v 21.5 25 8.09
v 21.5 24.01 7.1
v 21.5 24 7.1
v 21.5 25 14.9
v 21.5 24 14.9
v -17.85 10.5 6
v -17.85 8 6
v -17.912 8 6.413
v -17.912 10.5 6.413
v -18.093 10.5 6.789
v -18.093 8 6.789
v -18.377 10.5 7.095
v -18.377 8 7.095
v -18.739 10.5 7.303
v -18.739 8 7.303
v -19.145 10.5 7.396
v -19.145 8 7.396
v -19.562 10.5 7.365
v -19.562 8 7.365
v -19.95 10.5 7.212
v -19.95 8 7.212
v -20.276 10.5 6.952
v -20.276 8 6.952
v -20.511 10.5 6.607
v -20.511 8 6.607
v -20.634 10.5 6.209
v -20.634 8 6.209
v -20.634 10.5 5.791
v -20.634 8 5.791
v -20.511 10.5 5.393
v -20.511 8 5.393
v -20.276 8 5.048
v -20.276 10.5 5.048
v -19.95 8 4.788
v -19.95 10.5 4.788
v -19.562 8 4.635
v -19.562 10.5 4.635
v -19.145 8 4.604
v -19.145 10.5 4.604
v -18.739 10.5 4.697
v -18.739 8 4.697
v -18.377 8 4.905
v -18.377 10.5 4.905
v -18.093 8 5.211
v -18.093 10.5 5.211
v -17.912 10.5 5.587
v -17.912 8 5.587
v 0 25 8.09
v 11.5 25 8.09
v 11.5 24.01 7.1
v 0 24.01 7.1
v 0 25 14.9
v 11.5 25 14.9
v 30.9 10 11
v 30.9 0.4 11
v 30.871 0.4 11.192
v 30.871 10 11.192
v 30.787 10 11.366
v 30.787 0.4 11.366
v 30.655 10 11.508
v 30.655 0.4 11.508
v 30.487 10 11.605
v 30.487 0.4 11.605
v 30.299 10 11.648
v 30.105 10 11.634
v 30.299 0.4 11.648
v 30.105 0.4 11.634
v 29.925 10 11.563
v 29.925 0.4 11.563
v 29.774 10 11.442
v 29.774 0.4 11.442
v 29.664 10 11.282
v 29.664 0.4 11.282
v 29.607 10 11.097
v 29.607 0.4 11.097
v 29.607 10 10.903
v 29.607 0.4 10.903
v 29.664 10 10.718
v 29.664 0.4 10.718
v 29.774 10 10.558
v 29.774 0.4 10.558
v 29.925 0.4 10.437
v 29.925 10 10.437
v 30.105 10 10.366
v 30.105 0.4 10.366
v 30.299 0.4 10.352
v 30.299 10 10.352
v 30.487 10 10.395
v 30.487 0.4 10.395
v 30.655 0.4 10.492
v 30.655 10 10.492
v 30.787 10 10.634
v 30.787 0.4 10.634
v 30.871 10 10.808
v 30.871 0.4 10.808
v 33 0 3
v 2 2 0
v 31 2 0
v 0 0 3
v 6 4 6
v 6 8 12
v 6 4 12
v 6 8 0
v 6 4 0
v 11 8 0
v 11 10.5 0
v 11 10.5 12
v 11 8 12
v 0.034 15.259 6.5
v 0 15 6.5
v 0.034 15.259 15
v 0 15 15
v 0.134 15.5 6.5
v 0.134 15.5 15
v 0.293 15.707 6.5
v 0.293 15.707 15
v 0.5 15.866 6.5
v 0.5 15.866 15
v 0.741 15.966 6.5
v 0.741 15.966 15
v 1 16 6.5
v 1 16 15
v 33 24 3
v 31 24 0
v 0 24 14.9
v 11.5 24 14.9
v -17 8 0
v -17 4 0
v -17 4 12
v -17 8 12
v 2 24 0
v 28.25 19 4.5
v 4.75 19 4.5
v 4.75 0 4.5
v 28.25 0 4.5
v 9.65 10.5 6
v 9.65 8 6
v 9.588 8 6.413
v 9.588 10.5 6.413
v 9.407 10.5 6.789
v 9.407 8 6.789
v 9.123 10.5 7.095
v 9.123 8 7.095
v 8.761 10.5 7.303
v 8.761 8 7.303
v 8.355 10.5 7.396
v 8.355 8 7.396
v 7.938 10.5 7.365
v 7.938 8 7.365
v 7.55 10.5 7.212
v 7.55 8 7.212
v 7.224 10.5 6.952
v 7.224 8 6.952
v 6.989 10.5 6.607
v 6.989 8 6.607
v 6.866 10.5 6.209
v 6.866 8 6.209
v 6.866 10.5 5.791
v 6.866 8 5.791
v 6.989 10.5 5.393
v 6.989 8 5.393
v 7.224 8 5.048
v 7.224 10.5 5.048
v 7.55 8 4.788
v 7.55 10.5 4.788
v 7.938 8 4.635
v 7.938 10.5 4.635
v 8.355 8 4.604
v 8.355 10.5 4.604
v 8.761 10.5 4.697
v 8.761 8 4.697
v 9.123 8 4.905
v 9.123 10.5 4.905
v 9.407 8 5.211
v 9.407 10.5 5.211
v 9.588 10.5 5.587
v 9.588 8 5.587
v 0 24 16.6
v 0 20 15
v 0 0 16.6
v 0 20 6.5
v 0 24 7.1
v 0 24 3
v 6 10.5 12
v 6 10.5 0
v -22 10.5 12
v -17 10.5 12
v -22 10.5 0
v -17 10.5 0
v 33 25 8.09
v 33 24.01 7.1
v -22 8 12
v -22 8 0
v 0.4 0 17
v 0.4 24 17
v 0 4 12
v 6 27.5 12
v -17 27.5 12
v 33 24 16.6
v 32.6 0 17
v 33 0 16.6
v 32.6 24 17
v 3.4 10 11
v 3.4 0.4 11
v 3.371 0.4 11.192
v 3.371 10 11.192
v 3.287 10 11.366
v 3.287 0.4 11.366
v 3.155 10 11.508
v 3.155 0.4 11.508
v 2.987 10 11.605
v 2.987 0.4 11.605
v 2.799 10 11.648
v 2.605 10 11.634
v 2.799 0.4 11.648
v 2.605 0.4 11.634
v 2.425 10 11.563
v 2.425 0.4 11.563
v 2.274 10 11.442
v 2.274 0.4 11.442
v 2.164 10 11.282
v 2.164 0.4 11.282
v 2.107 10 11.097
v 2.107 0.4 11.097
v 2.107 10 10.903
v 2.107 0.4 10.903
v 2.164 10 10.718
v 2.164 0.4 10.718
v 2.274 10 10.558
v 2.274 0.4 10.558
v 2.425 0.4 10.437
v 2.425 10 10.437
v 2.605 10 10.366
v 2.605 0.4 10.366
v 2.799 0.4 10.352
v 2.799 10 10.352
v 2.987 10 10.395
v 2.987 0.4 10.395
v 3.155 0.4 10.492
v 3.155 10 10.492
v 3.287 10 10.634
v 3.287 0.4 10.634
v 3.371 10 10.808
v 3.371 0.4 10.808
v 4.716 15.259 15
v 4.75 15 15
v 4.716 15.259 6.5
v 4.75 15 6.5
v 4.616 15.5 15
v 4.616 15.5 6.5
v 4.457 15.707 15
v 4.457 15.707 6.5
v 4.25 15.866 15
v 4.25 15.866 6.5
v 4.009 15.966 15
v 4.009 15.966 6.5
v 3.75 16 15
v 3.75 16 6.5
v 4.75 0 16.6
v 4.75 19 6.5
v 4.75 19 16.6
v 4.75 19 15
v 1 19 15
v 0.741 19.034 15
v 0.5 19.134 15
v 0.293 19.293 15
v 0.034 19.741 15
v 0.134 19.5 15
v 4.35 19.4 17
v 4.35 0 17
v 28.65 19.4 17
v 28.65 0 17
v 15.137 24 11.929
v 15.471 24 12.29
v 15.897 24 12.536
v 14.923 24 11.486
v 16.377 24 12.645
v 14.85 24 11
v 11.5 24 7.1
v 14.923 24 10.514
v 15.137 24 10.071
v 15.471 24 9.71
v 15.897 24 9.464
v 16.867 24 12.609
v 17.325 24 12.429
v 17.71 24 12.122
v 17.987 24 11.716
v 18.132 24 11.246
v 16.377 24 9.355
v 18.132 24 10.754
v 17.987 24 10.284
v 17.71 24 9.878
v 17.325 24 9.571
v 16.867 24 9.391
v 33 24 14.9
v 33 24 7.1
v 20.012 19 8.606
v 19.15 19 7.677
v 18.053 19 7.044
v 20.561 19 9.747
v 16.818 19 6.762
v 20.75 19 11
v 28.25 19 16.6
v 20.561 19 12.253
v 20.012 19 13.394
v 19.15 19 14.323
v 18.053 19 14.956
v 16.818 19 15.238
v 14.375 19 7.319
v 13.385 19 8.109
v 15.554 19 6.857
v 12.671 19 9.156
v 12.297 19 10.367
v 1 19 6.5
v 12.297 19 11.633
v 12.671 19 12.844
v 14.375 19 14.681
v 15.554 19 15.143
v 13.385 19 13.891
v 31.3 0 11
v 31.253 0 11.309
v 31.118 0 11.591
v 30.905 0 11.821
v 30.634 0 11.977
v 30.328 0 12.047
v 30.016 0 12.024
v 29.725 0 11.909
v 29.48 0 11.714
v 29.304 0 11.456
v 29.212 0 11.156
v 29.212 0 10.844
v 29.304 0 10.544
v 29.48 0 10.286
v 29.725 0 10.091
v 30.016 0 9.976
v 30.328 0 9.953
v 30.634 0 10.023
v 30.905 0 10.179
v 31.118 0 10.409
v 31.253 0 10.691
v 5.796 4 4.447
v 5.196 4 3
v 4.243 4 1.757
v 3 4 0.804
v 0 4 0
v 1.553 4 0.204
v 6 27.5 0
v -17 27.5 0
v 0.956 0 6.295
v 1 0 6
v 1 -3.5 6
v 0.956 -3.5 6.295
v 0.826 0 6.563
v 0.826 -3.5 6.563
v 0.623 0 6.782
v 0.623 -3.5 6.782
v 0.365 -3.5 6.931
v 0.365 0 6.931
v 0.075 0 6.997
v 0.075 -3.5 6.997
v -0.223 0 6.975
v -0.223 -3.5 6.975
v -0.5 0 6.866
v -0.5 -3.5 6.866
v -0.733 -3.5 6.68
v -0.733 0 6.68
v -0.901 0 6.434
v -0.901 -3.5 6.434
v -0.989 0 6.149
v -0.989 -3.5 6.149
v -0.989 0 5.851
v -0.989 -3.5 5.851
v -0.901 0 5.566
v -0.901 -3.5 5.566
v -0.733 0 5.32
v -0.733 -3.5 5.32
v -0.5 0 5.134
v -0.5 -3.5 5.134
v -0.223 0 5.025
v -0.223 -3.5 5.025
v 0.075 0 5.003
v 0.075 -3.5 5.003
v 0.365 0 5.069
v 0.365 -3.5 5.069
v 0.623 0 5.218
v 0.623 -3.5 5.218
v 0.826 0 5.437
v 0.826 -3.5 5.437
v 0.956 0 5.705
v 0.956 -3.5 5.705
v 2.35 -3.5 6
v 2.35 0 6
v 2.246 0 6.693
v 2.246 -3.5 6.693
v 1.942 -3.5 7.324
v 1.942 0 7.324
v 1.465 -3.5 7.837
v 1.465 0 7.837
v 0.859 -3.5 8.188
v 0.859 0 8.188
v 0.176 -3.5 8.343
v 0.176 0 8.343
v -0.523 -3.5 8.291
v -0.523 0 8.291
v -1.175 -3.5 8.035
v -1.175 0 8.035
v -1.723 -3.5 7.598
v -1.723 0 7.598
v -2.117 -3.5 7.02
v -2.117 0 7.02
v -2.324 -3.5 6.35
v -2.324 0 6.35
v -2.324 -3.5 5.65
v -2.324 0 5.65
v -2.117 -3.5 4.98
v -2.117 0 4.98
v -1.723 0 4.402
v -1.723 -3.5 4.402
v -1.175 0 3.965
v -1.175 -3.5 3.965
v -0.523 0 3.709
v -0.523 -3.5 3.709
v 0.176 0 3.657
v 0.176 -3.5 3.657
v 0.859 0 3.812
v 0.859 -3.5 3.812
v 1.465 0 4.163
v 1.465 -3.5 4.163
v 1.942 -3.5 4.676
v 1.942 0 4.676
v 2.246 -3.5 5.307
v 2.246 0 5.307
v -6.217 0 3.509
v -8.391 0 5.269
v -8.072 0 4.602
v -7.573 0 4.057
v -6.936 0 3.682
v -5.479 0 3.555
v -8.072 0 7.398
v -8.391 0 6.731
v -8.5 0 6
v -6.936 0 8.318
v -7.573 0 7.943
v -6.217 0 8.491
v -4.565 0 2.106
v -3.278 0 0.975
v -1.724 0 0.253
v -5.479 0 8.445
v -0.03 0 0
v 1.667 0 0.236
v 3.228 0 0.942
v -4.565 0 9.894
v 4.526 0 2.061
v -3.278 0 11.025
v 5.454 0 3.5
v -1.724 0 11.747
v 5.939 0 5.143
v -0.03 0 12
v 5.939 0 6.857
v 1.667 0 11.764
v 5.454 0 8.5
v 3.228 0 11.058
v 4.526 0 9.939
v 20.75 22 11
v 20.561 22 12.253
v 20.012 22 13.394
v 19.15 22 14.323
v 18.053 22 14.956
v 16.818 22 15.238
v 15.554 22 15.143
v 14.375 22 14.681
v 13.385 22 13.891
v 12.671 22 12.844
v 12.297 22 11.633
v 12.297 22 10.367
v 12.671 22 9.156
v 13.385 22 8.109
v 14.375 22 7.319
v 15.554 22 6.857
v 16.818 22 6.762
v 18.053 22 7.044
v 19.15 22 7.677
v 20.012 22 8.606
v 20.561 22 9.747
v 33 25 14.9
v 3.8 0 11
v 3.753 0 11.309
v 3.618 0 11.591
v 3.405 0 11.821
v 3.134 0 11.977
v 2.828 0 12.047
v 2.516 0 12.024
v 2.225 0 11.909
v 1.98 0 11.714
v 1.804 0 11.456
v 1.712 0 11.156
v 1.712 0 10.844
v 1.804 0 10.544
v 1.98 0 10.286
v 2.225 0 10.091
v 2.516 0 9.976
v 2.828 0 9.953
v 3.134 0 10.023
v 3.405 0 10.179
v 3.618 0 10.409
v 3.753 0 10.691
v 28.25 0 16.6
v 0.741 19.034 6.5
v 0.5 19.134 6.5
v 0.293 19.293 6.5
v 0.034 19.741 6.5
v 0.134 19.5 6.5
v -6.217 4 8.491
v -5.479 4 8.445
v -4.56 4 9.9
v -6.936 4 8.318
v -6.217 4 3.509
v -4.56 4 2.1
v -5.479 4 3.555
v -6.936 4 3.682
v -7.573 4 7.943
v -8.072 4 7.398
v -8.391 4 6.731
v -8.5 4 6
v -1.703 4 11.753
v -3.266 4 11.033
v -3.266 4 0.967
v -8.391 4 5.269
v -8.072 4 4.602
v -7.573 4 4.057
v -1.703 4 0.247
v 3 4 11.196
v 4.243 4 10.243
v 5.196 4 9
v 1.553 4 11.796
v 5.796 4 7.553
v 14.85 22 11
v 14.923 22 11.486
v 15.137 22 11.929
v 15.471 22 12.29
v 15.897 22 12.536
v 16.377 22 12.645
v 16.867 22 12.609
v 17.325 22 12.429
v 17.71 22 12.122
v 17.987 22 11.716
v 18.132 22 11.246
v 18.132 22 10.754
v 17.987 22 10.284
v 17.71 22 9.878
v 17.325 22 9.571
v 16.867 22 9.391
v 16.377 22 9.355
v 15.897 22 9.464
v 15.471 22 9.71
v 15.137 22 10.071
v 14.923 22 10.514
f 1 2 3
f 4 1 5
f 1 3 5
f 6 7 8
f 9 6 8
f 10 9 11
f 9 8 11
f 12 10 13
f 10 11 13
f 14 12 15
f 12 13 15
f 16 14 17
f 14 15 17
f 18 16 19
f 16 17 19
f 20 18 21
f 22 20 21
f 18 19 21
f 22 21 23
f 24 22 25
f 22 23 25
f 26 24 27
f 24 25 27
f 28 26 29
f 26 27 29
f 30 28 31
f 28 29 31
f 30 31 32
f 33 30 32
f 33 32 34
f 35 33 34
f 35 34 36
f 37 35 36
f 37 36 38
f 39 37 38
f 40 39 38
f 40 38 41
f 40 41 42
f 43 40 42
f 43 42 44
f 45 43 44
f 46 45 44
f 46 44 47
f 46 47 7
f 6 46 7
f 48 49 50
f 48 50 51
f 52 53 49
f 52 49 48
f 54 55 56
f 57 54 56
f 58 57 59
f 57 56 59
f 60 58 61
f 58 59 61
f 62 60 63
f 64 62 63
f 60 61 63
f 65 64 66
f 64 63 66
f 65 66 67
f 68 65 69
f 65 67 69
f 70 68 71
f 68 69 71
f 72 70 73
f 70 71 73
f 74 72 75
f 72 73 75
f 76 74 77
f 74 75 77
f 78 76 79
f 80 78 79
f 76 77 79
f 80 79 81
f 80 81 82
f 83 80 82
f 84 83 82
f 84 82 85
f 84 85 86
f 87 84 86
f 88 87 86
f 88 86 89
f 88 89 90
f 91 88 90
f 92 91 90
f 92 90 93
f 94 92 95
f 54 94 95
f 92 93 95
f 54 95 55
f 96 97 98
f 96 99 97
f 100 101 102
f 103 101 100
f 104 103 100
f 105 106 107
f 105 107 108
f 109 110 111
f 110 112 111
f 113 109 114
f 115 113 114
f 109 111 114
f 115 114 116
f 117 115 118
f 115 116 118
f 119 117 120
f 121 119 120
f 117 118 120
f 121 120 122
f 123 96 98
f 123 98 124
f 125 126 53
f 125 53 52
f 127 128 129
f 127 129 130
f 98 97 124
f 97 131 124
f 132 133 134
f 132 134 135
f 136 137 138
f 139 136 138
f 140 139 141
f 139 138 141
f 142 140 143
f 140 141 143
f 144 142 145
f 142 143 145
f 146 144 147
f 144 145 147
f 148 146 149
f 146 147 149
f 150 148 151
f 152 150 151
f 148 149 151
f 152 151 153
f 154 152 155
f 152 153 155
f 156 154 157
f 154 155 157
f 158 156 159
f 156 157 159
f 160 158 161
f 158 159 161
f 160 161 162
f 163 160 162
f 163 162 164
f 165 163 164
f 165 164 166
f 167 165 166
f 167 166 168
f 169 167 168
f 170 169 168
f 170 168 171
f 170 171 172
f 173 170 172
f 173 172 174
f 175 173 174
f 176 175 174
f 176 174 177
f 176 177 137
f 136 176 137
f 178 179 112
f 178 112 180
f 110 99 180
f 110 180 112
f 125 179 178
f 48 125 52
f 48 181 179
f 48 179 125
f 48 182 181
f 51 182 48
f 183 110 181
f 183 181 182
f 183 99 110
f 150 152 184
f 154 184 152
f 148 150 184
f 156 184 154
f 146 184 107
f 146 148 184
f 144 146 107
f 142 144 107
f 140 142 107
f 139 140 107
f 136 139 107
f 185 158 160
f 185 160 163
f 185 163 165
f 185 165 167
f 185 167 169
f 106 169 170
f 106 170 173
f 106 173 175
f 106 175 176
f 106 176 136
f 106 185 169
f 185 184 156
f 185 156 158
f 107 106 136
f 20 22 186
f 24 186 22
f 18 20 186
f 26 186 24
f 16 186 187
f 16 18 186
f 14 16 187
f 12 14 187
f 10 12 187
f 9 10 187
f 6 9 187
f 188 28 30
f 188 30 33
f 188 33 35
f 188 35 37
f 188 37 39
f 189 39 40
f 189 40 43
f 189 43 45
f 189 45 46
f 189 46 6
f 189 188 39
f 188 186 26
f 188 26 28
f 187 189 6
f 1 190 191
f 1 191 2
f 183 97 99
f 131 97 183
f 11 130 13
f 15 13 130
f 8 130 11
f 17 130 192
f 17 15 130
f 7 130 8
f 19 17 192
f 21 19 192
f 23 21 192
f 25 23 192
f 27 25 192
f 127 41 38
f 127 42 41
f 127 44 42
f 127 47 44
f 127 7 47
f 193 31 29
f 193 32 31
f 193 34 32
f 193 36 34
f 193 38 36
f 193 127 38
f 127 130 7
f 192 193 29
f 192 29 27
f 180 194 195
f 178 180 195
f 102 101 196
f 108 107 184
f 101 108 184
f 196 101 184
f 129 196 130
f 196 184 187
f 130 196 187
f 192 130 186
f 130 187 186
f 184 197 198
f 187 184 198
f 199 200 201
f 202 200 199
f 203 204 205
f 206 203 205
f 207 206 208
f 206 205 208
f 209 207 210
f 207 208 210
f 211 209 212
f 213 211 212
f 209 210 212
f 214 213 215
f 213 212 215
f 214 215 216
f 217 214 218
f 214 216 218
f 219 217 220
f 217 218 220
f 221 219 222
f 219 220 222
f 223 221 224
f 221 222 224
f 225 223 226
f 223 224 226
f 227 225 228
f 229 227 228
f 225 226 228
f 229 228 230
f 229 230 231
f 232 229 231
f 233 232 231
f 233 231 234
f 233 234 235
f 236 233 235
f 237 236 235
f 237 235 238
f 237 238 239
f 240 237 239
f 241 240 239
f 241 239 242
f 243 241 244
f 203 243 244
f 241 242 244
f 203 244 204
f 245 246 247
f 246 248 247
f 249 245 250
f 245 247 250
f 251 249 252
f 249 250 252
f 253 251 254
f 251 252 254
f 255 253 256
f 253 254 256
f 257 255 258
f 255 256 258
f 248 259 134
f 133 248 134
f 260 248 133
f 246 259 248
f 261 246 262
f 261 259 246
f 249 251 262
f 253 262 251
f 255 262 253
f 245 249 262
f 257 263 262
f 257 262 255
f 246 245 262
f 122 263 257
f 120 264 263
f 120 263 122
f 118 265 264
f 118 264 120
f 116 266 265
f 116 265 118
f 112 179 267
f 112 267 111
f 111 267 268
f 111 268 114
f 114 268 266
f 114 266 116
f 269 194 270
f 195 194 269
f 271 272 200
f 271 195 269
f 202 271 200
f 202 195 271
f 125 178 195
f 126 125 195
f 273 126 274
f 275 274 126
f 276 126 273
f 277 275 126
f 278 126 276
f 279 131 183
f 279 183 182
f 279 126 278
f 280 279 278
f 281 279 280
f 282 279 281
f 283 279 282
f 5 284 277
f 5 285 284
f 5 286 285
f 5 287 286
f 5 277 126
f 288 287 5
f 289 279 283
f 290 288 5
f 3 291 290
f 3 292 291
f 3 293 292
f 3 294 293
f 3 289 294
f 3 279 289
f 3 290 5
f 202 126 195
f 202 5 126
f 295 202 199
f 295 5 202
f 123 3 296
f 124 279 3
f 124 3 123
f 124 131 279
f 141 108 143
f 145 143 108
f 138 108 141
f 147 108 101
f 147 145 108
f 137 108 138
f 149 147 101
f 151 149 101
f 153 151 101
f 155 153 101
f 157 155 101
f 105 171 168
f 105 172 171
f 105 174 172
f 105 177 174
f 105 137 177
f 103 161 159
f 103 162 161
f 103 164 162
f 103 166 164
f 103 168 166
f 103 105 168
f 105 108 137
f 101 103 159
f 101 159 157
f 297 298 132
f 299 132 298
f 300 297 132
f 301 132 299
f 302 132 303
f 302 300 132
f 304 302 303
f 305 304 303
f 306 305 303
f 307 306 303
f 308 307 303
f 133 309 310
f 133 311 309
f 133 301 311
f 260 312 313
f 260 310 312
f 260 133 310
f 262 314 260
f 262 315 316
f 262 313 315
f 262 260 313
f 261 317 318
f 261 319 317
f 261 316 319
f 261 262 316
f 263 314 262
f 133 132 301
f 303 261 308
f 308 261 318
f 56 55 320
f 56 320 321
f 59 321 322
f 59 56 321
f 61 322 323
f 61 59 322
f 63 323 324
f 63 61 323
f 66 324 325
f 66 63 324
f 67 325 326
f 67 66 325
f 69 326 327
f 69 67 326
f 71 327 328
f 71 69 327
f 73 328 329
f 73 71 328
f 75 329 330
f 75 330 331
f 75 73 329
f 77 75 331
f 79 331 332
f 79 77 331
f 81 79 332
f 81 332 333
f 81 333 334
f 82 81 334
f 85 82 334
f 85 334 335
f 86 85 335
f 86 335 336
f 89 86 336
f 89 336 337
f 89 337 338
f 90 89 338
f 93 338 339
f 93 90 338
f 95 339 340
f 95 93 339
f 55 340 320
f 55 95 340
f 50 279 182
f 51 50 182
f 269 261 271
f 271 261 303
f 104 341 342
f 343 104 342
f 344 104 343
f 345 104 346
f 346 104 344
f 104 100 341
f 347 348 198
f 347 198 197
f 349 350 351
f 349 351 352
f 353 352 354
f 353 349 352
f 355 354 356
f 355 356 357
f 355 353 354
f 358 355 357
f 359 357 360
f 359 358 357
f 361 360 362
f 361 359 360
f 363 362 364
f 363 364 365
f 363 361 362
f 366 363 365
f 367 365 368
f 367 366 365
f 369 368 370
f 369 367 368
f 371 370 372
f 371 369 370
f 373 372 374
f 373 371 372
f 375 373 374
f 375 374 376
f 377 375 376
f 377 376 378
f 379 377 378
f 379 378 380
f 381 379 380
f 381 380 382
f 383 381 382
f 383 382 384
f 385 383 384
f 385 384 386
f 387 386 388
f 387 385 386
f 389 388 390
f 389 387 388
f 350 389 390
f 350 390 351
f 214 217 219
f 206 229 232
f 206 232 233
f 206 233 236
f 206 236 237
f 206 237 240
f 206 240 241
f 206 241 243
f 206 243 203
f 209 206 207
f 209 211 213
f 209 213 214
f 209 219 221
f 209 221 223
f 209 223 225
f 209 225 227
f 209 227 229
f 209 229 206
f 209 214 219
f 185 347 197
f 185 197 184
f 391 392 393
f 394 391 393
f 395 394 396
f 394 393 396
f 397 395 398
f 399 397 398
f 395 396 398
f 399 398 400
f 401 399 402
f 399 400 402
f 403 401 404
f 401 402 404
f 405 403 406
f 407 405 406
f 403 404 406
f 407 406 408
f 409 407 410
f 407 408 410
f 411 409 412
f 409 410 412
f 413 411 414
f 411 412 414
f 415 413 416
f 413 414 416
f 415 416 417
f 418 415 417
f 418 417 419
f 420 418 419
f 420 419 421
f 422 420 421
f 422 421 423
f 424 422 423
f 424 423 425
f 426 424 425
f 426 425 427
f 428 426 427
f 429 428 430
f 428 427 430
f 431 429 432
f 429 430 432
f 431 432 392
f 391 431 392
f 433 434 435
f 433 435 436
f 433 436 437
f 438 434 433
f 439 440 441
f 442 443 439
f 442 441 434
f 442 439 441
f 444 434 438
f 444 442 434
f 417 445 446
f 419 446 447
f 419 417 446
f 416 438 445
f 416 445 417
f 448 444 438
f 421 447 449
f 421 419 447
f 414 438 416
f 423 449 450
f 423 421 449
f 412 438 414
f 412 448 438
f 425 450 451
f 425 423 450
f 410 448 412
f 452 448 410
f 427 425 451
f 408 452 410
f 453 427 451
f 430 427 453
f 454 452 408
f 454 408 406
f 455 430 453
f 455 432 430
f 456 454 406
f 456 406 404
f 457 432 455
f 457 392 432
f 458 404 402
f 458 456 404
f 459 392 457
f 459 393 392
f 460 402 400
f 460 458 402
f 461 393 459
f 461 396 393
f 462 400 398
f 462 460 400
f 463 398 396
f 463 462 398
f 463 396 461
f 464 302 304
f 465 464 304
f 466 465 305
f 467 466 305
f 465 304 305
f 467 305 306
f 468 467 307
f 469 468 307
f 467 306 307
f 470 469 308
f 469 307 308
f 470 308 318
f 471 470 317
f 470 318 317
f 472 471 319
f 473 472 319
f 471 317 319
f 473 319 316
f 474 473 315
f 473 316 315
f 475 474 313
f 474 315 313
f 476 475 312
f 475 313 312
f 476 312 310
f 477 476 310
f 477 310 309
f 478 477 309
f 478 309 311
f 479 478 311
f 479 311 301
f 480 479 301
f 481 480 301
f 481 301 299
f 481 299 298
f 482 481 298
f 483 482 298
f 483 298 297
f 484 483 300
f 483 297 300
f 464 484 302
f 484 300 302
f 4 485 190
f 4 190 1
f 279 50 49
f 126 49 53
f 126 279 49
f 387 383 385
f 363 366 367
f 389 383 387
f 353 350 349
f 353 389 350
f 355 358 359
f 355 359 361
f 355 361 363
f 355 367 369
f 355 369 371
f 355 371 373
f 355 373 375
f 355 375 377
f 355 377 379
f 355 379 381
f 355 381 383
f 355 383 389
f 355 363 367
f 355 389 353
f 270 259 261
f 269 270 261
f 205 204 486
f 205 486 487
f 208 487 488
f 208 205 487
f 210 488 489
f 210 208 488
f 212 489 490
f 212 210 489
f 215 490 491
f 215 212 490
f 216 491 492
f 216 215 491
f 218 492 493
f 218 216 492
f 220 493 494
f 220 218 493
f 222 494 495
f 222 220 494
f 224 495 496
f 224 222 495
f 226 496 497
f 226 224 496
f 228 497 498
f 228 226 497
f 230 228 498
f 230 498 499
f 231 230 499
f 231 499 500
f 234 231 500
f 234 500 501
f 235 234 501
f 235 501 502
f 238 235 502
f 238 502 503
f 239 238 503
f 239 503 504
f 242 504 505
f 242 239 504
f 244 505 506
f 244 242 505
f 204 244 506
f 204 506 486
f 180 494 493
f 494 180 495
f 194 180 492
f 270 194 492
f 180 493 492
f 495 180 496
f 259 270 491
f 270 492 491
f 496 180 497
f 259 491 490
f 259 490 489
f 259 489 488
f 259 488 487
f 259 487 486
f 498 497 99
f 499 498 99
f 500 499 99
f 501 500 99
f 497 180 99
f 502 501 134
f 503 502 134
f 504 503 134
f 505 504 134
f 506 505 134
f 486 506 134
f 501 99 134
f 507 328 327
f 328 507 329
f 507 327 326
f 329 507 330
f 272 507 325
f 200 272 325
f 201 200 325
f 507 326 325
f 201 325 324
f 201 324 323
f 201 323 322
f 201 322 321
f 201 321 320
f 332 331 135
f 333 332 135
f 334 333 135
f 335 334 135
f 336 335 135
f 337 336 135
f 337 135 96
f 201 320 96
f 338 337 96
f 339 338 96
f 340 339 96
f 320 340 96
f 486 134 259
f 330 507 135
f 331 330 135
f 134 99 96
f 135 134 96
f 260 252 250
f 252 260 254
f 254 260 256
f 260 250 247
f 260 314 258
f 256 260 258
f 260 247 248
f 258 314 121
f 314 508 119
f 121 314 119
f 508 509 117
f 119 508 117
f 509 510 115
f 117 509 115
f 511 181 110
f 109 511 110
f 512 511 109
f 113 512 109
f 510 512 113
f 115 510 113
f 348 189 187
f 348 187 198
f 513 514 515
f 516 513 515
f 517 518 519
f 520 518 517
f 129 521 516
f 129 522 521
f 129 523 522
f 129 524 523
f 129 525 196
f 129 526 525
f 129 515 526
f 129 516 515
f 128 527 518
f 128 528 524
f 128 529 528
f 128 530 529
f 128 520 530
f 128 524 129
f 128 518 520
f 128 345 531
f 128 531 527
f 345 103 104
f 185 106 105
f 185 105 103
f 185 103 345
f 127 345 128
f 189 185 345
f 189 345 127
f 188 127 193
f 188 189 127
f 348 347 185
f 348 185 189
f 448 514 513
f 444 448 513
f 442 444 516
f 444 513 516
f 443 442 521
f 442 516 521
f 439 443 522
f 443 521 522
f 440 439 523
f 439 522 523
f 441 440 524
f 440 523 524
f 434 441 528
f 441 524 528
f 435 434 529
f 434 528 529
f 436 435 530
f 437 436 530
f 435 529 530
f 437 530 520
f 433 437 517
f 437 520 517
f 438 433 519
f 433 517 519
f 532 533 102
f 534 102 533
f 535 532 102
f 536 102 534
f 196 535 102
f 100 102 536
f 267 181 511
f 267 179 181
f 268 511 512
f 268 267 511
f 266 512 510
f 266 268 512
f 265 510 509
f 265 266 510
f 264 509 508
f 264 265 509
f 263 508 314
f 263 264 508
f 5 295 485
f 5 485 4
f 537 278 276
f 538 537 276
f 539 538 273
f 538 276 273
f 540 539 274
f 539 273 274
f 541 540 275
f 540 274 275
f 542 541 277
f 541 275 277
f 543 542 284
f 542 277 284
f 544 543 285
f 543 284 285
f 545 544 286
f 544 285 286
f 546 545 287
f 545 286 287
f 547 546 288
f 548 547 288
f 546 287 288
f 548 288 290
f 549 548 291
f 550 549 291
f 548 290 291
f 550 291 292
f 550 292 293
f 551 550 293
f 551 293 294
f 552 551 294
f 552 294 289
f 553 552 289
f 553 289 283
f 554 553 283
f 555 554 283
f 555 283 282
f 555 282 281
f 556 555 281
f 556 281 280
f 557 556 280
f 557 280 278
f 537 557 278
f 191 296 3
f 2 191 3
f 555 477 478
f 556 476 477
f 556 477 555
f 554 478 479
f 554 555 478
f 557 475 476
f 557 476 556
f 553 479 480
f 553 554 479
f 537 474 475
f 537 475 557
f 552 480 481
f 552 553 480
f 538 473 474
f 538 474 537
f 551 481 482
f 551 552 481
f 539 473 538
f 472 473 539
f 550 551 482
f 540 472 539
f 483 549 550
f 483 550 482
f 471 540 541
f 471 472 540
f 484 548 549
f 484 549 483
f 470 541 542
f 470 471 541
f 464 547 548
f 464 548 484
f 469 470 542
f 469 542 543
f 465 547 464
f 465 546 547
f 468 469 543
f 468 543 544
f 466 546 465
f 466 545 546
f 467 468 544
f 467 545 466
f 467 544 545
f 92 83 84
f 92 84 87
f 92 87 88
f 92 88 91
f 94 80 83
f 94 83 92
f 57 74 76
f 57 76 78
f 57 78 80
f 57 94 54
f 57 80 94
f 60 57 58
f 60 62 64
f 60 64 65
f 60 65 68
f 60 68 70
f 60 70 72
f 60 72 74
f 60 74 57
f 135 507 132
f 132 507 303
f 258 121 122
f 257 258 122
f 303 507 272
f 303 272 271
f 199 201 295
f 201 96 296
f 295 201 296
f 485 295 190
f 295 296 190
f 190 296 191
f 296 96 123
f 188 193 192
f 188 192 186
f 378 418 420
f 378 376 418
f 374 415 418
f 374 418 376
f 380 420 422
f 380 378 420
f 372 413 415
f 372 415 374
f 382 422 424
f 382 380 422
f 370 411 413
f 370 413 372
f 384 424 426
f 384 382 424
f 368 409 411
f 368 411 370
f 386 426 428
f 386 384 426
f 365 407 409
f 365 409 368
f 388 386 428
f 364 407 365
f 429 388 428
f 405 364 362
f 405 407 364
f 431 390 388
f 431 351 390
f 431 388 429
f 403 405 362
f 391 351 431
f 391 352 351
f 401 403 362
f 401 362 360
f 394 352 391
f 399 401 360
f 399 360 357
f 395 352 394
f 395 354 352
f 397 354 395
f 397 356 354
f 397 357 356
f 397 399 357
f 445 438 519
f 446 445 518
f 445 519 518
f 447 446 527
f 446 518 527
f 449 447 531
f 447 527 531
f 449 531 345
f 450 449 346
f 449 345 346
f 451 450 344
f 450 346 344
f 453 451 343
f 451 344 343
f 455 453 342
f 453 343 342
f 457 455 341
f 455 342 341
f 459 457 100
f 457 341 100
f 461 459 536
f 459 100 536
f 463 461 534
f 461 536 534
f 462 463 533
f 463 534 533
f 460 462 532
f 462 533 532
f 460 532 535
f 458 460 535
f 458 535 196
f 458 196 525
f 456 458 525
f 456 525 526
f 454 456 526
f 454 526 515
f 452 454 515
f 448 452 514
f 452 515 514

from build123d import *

# Parameters (mm, degrees)
PAD_DEPTH        = 12
PAD001_DEPTH     = 4
SKETCH002_R      = 2.35
SKETCH002_R_2    = 1
PAD002_DEPTH     = 3.5
SKETCH003_R      = 1.4
POCKET_DEPTH     = 19.501
SKETCH004_W      = 33
SKETCH004_H      = 24
PAD003_DEPTH     = 17
SKETCH005_W      = 23.5
SKETCH005_H      = 19
POCKET001_DEPTH  = 12.5
SKETCH006_W      = 3
SKETCH006_H      = 8.5
POCKET002_DEPTH  = 5
SKETCH007_R      = 0.65
POCKET003_DEPTH  = 10
SKETCH008_W      = 11.5
SKETCH008_H      = 7.8
PAD004_DEPTH     = 1
CHAMFER_SIZE     = 0.99
SKETCH009_R      = 1.65
POCKET004_DEPTH  = 5
SKETCH010_R      = 4.25
POCKET005_DEPTH  = 3
CHAMFER001_SIZE2 = 3
CHAMFER001_SIZE  = 2
CHAMFER002_SIZE2 = 2
CHAMFER002_SIZE  = 3
CHAMFER003_SIZE2 = 3
CHAMFER003_SIZE  = 2
CHAMFER004_SIZE  = 0.4
CHAMFER005_SIZE  = 0.4
FILLET_R         = 1


with BuildPart() as servo_pref:
    # Sketch → Pad (new body)
    with BuildSketch(Plane.XY):
        Polygon((-22, 10.5), (-17, 10.5), (-17, 27.5), (6, 27.5), (6, 10.5), (11, 10.5), (11, 8), (6, 8), (6, 4), (-17, 4), (-17, 8), (-22, 8), align=None)
    extrude(amount=PAD_DEPTH)

    # Sketch001 (on Face9 of Pad) → Pad001 (join)
    with BuildSketch(Plane.XZ.offset(-4)):
        with BuildLine():
            ThreePointArc((-5.479167, 3.554855), (6, 6), (-5.479167, 8.445145))
            ThreePointArc((-5.479167, 8.445145), (-8.5, 6), (-5.479167, 3.554855))
        make_face()
    extrude(amount=PAD001_DEPTH)

    # Sketch002 (on Face19 of Pad001) → Pad002 (join)
    with BuildSketch(Plane.XZ):
        with Locations((0, 6)):
            Circle(SKETCH002_R)
        with Locations((0, 6)):
            Circle(SKETCH002_R_2, mode=Mode.SUBTRACT)
    extrude(amount=PAD002_DEPTH)

    # Sketch003 (on Face6 of Pad002) → Pocket (cut, through all)
    with BuildSketch(Plane.XZ.offset(-8)):
        with Locations((-19.25, 6)):
            Circle(SKETCH003_R)
        with Locations((8.25, 6)):
            Circle(SKETCH003_R)
    extrude(amount=-POCKET_DEPTH, mode=Mode.SUBTRACT)


with BuildPart() as body001:
    # Sketch004 → Pad003 (new body)
    with BuildSketch(Plane.XY):
        with Locations((16.5, 12)):
            Rectangle(SKETCH004_W, SKETCH004_H)
    extrude(amount=PAD003_DEPTH)

    # Sketch005 (on Face6 of Pad003) → Pocket001 (cut)
    with BuildSketch(Plane.XY.offset(17)):
        with Locations((16.5, 9.5)):
            Rectangle(SKETCH005_W, SKETCH005_H)
    extrude(amount=-POCKET001_DEPTH, mode=Mode.SUBTRACT)

    # Sketch006 (on Face8 of Pocket001) → Pocket002 (cut)
    with BuildSketch(Plane(origin=(0, 0, 0), x_dir=(0, -1, 0), z_dir=(-1, 0, 0))):
        with Locations((-17.5, 10.75)):
            Rectangle(SKETCH006_W, SKETCH006_H)
    extrude(amount=-POCKET002_DEPTH, mode=Mode.SUBTRACT)

    # Sketch007 (on Face1 of Pocket002) → Pocket003 (cut)
    with BuildSketch(Plane.XZ):
        with Locations((2.75, 11)):
            Circle(SKETCH007_R)
        with Locations((30.25, 11)):
            Circle(SKETCH007_R)
    extrude(amount=-POCKET003_DEPTH, mode=Mode.SUBTRACT)

    # Sketch008 (on Face11 of Pocket003) → Pad004 (join)
    with BuildSketch(Plane(origin=(0, 24, 0), x_dir=(-1, 0, 0), z_dir=(0, 1, 0))):
        with Locations((-27.25, 11)):
            Rectangle(SKETCH008_W, SKETCH008_H)
        with Locations((-5.75, 11)):
            Rectangle(SKETCH008_W, SKETCH008_H)
    extrude(amount=PAD004_DEPTH)

    # Chamfer
    chamfer_edges = [body001.edges().sort_by_distance(p)[0] for p in [
        (27.25, 25, 7.1),
        (5.75, 25, 7.1),
    ]]
    chamfer(chamfer_edges, length=CHAMFER_SIZE)

    # Sketch009 (on Face7 of Chamfer) → Pocket004 (cut)
    with BuildSketch(Plane(origin=(0, 24, 0), x_dir=(-1, 0, 0), z_dir=(0, 1, 0))):
        with Locations((-16.5, 11)):
            Circle(SKETCH009_R)
    extrude(amount=-POCKET004_DEPTH, mode=Mode.SUBTRACT)

    # Sketch010 (on Face22 of Pocket004) → Pocket005 (cut)
    with BuildSketch(Plane.XZ.offset(-19)):
        with Locations((16.5, 11)):
            Circle(SKETCH010_R)
    extrude(amount=-POCKET005_DEPTH, mode=Mode.SUBTRACT)

    # Chamfer001
    chamfer001_edges = [body001.edges().sort_by_distance(p)[0] for p in [
        (16.5, 0, 0),
    ]]
    chamfer001_side = body001.faces().sort_by_distance((16.5, 12, 0))[0]
    chamfer(chamfer001_edges, length=CHAMFER001_SIZE, length2=CHAMFER001_SIZE2, reference=chamfer001_side)

    # Chamfer002
    chamfer002_edges = [body001.edges().sort_by_distance(p)[0] for p in [
        (0, 13, 0),
    ]]
    chamfer002_side = body001.faces().sort_by_distance((0, 11.720026, 8.408103))[0]
    chamfer(chamfer002_edges, length=CHAMFER002_SIZE, length2=CHAMFER002_SIZE2, reference=chamfer002_side)

    # Chamfer003
    chamfer003_edges = [body001.edges().sort_by_distance(p)[0] for p in [
        (33, 13, 0),
    ]]
    chamfer003_side = body001.faces().sort_by_distance((17.5, 13, 0))[0]
    chamfer(chamfer003_edges, length=CHAMFER003_SIZE, length2=CHAMFER003_SIZE2, reference=chamfer003_side)

    # Chamfer004
    chamfer004_edges = [body001.edges().sort_by_distance(p)[0] for p in [
        (0, 12, 17),
        (4.75, 9.5, 17),
        (16.5, 19, 17),
        (28.25, 9.5, 17),
        (33, 12, 17),
    ]]
    chamfer(chamfer004_edges, length=CHAMFER004_SIZE)

    # Chamfer005
    chamfer005_edges = [body001.edges().sort_by_distance(p)[0] for p in [
        (2.1, 0, 11),
        (29.6, 0, 11),
    ]]
    chamfer(chamfer005_edges, length=CHAMFER005_SIZE)

    # Fillet
    fillet_edges = [body001.edges().sort_by_distance(p)[0] for p in [
        (4.75, 16, 10.75),
        (0, 19, 10.75),
        (0, 16, 10.75),
    ]]
    fillet(fillet_edges, radius=FILLET_R)


solid = Compound([servo_pref.part, body001.part])
